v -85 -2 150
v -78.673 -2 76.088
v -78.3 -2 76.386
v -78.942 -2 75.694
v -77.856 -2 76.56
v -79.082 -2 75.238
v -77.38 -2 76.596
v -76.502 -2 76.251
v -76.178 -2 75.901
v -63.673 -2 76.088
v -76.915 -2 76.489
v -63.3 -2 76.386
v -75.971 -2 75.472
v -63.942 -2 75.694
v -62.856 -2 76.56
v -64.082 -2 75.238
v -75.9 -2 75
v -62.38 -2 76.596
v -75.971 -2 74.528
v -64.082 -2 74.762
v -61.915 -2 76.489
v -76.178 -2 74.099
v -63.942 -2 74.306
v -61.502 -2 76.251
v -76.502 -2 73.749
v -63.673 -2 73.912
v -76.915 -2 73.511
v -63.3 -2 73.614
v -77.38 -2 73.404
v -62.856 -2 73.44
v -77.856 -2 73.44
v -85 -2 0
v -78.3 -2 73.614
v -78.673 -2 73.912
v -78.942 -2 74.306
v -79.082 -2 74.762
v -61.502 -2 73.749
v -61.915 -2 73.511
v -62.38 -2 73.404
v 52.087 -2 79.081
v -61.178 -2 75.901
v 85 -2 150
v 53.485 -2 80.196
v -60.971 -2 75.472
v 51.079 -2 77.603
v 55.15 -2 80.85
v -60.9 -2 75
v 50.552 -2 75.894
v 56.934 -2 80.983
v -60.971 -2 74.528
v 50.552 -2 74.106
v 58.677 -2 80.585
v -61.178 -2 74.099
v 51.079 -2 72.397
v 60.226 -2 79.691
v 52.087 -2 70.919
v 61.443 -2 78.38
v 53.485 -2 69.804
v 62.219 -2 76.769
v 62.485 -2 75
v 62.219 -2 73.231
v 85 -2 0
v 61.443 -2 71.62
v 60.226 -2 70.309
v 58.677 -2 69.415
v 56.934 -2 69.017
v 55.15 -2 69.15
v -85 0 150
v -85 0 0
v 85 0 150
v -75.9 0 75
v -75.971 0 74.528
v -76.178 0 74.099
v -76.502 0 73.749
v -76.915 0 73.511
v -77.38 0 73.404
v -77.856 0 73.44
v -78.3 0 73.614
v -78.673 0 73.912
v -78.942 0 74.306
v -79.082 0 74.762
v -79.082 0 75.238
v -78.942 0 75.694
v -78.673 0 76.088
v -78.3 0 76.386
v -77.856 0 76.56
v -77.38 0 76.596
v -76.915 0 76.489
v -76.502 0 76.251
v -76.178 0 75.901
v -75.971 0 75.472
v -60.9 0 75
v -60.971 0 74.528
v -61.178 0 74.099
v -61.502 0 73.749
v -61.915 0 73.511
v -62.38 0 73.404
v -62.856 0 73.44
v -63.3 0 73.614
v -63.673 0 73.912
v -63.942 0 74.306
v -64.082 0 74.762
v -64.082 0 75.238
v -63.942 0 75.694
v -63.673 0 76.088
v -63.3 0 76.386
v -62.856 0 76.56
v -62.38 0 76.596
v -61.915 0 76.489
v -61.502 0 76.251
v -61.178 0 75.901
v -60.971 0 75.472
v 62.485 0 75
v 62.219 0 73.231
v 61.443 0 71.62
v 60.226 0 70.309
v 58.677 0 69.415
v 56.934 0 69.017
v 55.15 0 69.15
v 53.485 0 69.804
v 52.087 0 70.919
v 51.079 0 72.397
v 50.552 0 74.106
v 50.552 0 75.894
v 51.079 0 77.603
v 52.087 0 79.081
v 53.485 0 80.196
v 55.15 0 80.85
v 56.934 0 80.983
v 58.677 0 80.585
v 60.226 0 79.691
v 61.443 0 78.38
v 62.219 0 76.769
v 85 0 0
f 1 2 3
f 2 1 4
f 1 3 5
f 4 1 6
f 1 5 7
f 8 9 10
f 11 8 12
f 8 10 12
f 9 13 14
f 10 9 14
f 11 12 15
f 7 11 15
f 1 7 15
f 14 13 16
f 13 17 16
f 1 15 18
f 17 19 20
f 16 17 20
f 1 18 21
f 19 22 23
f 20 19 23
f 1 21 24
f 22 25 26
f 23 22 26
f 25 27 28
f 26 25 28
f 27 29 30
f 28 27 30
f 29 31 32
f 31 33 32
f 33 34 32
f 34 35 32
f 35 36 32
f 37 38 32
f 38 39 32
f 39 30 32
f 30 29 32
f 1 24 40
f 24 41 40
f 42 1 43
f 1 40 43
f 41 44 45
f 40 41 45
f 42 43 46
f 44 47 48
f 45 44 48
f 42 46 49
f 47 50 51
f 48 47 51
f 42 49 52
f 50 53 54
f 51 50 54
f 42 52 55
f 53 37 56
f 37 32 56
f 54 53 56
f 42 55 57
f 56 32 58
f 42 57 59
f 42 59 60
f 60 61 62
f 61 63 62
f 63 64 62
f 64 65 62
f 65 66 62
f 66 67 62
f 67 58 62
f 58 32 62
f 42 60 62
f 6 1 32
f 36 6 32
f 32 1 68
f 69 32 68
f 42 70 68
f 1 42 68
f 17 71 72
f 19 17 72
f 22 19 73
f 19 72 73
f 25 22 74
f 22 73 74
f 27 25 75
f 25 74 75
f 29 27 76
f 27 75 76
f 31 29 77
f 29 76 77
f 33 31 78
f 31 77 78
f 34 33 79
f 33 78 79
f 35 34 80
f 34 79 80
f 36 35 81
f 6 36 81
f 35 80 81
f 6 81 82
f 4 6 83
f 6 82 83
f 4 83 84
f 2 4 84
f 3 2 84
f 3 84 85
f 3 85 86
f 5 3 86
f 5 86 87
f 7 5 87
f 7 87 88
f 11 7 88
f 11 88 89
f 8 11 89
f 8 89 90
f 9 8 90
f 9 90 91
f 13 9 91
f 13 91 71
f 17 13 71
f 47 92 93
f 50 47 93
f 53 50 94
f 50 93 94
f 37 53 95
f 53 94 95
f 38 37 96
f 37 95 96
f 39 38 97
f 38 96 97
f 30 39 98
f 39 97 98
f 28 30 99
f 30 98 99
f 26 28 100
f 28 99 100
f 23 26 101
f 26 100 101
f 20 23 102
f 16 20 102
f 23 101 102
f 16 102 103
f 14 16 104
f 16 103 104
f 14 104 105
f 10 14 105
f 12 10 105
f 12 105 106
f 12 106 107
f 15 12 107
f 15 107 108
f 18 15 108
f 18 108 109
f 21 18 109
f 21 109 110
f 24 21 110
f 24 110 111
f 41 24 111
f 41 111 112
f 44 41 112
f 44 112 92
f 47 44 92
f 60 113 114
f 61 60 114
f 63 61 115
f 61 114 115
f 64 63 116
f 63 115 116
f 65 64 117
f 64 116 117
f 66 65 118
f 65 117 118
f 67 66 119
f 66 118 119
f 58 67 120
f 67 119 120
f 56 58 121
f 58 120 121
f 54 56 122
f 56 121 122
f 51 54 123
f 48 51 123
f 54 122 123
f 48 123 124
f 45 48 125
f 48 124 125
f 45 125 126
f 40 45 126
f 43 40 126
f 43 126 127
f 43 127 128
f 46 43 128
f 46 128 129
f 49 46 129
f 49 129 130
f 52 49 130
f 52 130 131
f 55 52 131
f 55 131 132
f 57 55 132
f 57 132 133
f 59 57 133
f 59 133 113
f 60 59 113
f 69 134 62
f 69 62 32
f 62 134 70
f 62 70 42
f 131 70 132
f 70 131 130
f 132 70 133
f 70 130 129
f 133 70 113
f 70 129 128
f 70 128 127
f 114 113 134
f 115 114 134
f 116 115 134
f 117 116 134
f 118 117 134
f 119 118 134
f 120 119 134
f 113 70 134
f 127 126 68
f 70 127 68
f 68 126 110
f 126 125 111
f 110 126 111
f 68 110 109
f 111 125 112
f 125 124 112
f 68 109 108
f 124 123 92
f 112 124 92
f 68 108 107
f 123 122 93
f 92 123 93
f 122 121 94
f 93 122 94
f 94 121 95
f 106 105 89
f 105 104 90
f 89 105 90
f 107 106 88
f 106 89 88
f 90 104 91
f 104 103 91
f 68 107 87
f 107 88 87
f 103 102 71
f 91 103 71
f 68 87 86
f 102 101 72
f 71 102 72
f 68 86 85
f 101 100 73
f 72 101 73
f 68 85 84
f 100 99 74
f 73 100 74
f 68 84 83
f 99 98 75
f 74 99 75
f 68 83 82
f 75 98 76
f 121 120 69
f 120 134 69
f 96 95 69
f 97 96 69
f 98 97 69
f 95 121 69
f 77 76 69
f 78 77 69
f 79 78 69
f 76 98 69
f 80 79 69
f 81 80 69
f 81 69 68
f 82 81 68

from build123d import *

# Parameters (mm, degrees)
BOSS_EXTRUDE3_DEPTH = 150
SKETCH4_R           = 1.6
CUT_EXTRUDE1_DEPTH  = 10
SKETCH5_R           = 6
CUT_EXTRUDE2_DEPTH  = 10


with BuildPart() as part:
    # Sketch3 → Boss-Extrude3 (new body)
    with BuildSketch(Plane.XY):
        Polygon((0, 0), (85, 0), (85, -2), (0, -2), (-85, -2), (-85, 0), align=None)
    extrude(amount=BOSS_EXTRUDE3_DEPTH)

    # Sketch4 → Cut-Extrude1 (cut)
    with BuildSketch(Plane(origin=(0, 0, 0), x_dir=(1, 0, 0), z_dir=(0, 1, 0))):
        with Locations((-77.5, -75)):
            Circle(SKETCH4_R)
        with Locations((-62.5, -75)):
            Circle(SKETCH4_R)
    extrude(amount=-CUT_EXTRUDE1_DEPTH, mode=Mode.SUBTRACT)

    # Sketch5 → Cut-Extrude2 (cut)
    with BuildSketch(Plane(origin=(0, 0, 0), x_dir=(1, 0, 0), z_dir=(0, 1, 0))):
        with Locations((56.485157875, -75)):
            Circle(SKETCH5_R)
    extrude(amount=-CUT_EXTRUDE2_DEPTH, mode=Mode.SUBTRACT)


solid = part.part
